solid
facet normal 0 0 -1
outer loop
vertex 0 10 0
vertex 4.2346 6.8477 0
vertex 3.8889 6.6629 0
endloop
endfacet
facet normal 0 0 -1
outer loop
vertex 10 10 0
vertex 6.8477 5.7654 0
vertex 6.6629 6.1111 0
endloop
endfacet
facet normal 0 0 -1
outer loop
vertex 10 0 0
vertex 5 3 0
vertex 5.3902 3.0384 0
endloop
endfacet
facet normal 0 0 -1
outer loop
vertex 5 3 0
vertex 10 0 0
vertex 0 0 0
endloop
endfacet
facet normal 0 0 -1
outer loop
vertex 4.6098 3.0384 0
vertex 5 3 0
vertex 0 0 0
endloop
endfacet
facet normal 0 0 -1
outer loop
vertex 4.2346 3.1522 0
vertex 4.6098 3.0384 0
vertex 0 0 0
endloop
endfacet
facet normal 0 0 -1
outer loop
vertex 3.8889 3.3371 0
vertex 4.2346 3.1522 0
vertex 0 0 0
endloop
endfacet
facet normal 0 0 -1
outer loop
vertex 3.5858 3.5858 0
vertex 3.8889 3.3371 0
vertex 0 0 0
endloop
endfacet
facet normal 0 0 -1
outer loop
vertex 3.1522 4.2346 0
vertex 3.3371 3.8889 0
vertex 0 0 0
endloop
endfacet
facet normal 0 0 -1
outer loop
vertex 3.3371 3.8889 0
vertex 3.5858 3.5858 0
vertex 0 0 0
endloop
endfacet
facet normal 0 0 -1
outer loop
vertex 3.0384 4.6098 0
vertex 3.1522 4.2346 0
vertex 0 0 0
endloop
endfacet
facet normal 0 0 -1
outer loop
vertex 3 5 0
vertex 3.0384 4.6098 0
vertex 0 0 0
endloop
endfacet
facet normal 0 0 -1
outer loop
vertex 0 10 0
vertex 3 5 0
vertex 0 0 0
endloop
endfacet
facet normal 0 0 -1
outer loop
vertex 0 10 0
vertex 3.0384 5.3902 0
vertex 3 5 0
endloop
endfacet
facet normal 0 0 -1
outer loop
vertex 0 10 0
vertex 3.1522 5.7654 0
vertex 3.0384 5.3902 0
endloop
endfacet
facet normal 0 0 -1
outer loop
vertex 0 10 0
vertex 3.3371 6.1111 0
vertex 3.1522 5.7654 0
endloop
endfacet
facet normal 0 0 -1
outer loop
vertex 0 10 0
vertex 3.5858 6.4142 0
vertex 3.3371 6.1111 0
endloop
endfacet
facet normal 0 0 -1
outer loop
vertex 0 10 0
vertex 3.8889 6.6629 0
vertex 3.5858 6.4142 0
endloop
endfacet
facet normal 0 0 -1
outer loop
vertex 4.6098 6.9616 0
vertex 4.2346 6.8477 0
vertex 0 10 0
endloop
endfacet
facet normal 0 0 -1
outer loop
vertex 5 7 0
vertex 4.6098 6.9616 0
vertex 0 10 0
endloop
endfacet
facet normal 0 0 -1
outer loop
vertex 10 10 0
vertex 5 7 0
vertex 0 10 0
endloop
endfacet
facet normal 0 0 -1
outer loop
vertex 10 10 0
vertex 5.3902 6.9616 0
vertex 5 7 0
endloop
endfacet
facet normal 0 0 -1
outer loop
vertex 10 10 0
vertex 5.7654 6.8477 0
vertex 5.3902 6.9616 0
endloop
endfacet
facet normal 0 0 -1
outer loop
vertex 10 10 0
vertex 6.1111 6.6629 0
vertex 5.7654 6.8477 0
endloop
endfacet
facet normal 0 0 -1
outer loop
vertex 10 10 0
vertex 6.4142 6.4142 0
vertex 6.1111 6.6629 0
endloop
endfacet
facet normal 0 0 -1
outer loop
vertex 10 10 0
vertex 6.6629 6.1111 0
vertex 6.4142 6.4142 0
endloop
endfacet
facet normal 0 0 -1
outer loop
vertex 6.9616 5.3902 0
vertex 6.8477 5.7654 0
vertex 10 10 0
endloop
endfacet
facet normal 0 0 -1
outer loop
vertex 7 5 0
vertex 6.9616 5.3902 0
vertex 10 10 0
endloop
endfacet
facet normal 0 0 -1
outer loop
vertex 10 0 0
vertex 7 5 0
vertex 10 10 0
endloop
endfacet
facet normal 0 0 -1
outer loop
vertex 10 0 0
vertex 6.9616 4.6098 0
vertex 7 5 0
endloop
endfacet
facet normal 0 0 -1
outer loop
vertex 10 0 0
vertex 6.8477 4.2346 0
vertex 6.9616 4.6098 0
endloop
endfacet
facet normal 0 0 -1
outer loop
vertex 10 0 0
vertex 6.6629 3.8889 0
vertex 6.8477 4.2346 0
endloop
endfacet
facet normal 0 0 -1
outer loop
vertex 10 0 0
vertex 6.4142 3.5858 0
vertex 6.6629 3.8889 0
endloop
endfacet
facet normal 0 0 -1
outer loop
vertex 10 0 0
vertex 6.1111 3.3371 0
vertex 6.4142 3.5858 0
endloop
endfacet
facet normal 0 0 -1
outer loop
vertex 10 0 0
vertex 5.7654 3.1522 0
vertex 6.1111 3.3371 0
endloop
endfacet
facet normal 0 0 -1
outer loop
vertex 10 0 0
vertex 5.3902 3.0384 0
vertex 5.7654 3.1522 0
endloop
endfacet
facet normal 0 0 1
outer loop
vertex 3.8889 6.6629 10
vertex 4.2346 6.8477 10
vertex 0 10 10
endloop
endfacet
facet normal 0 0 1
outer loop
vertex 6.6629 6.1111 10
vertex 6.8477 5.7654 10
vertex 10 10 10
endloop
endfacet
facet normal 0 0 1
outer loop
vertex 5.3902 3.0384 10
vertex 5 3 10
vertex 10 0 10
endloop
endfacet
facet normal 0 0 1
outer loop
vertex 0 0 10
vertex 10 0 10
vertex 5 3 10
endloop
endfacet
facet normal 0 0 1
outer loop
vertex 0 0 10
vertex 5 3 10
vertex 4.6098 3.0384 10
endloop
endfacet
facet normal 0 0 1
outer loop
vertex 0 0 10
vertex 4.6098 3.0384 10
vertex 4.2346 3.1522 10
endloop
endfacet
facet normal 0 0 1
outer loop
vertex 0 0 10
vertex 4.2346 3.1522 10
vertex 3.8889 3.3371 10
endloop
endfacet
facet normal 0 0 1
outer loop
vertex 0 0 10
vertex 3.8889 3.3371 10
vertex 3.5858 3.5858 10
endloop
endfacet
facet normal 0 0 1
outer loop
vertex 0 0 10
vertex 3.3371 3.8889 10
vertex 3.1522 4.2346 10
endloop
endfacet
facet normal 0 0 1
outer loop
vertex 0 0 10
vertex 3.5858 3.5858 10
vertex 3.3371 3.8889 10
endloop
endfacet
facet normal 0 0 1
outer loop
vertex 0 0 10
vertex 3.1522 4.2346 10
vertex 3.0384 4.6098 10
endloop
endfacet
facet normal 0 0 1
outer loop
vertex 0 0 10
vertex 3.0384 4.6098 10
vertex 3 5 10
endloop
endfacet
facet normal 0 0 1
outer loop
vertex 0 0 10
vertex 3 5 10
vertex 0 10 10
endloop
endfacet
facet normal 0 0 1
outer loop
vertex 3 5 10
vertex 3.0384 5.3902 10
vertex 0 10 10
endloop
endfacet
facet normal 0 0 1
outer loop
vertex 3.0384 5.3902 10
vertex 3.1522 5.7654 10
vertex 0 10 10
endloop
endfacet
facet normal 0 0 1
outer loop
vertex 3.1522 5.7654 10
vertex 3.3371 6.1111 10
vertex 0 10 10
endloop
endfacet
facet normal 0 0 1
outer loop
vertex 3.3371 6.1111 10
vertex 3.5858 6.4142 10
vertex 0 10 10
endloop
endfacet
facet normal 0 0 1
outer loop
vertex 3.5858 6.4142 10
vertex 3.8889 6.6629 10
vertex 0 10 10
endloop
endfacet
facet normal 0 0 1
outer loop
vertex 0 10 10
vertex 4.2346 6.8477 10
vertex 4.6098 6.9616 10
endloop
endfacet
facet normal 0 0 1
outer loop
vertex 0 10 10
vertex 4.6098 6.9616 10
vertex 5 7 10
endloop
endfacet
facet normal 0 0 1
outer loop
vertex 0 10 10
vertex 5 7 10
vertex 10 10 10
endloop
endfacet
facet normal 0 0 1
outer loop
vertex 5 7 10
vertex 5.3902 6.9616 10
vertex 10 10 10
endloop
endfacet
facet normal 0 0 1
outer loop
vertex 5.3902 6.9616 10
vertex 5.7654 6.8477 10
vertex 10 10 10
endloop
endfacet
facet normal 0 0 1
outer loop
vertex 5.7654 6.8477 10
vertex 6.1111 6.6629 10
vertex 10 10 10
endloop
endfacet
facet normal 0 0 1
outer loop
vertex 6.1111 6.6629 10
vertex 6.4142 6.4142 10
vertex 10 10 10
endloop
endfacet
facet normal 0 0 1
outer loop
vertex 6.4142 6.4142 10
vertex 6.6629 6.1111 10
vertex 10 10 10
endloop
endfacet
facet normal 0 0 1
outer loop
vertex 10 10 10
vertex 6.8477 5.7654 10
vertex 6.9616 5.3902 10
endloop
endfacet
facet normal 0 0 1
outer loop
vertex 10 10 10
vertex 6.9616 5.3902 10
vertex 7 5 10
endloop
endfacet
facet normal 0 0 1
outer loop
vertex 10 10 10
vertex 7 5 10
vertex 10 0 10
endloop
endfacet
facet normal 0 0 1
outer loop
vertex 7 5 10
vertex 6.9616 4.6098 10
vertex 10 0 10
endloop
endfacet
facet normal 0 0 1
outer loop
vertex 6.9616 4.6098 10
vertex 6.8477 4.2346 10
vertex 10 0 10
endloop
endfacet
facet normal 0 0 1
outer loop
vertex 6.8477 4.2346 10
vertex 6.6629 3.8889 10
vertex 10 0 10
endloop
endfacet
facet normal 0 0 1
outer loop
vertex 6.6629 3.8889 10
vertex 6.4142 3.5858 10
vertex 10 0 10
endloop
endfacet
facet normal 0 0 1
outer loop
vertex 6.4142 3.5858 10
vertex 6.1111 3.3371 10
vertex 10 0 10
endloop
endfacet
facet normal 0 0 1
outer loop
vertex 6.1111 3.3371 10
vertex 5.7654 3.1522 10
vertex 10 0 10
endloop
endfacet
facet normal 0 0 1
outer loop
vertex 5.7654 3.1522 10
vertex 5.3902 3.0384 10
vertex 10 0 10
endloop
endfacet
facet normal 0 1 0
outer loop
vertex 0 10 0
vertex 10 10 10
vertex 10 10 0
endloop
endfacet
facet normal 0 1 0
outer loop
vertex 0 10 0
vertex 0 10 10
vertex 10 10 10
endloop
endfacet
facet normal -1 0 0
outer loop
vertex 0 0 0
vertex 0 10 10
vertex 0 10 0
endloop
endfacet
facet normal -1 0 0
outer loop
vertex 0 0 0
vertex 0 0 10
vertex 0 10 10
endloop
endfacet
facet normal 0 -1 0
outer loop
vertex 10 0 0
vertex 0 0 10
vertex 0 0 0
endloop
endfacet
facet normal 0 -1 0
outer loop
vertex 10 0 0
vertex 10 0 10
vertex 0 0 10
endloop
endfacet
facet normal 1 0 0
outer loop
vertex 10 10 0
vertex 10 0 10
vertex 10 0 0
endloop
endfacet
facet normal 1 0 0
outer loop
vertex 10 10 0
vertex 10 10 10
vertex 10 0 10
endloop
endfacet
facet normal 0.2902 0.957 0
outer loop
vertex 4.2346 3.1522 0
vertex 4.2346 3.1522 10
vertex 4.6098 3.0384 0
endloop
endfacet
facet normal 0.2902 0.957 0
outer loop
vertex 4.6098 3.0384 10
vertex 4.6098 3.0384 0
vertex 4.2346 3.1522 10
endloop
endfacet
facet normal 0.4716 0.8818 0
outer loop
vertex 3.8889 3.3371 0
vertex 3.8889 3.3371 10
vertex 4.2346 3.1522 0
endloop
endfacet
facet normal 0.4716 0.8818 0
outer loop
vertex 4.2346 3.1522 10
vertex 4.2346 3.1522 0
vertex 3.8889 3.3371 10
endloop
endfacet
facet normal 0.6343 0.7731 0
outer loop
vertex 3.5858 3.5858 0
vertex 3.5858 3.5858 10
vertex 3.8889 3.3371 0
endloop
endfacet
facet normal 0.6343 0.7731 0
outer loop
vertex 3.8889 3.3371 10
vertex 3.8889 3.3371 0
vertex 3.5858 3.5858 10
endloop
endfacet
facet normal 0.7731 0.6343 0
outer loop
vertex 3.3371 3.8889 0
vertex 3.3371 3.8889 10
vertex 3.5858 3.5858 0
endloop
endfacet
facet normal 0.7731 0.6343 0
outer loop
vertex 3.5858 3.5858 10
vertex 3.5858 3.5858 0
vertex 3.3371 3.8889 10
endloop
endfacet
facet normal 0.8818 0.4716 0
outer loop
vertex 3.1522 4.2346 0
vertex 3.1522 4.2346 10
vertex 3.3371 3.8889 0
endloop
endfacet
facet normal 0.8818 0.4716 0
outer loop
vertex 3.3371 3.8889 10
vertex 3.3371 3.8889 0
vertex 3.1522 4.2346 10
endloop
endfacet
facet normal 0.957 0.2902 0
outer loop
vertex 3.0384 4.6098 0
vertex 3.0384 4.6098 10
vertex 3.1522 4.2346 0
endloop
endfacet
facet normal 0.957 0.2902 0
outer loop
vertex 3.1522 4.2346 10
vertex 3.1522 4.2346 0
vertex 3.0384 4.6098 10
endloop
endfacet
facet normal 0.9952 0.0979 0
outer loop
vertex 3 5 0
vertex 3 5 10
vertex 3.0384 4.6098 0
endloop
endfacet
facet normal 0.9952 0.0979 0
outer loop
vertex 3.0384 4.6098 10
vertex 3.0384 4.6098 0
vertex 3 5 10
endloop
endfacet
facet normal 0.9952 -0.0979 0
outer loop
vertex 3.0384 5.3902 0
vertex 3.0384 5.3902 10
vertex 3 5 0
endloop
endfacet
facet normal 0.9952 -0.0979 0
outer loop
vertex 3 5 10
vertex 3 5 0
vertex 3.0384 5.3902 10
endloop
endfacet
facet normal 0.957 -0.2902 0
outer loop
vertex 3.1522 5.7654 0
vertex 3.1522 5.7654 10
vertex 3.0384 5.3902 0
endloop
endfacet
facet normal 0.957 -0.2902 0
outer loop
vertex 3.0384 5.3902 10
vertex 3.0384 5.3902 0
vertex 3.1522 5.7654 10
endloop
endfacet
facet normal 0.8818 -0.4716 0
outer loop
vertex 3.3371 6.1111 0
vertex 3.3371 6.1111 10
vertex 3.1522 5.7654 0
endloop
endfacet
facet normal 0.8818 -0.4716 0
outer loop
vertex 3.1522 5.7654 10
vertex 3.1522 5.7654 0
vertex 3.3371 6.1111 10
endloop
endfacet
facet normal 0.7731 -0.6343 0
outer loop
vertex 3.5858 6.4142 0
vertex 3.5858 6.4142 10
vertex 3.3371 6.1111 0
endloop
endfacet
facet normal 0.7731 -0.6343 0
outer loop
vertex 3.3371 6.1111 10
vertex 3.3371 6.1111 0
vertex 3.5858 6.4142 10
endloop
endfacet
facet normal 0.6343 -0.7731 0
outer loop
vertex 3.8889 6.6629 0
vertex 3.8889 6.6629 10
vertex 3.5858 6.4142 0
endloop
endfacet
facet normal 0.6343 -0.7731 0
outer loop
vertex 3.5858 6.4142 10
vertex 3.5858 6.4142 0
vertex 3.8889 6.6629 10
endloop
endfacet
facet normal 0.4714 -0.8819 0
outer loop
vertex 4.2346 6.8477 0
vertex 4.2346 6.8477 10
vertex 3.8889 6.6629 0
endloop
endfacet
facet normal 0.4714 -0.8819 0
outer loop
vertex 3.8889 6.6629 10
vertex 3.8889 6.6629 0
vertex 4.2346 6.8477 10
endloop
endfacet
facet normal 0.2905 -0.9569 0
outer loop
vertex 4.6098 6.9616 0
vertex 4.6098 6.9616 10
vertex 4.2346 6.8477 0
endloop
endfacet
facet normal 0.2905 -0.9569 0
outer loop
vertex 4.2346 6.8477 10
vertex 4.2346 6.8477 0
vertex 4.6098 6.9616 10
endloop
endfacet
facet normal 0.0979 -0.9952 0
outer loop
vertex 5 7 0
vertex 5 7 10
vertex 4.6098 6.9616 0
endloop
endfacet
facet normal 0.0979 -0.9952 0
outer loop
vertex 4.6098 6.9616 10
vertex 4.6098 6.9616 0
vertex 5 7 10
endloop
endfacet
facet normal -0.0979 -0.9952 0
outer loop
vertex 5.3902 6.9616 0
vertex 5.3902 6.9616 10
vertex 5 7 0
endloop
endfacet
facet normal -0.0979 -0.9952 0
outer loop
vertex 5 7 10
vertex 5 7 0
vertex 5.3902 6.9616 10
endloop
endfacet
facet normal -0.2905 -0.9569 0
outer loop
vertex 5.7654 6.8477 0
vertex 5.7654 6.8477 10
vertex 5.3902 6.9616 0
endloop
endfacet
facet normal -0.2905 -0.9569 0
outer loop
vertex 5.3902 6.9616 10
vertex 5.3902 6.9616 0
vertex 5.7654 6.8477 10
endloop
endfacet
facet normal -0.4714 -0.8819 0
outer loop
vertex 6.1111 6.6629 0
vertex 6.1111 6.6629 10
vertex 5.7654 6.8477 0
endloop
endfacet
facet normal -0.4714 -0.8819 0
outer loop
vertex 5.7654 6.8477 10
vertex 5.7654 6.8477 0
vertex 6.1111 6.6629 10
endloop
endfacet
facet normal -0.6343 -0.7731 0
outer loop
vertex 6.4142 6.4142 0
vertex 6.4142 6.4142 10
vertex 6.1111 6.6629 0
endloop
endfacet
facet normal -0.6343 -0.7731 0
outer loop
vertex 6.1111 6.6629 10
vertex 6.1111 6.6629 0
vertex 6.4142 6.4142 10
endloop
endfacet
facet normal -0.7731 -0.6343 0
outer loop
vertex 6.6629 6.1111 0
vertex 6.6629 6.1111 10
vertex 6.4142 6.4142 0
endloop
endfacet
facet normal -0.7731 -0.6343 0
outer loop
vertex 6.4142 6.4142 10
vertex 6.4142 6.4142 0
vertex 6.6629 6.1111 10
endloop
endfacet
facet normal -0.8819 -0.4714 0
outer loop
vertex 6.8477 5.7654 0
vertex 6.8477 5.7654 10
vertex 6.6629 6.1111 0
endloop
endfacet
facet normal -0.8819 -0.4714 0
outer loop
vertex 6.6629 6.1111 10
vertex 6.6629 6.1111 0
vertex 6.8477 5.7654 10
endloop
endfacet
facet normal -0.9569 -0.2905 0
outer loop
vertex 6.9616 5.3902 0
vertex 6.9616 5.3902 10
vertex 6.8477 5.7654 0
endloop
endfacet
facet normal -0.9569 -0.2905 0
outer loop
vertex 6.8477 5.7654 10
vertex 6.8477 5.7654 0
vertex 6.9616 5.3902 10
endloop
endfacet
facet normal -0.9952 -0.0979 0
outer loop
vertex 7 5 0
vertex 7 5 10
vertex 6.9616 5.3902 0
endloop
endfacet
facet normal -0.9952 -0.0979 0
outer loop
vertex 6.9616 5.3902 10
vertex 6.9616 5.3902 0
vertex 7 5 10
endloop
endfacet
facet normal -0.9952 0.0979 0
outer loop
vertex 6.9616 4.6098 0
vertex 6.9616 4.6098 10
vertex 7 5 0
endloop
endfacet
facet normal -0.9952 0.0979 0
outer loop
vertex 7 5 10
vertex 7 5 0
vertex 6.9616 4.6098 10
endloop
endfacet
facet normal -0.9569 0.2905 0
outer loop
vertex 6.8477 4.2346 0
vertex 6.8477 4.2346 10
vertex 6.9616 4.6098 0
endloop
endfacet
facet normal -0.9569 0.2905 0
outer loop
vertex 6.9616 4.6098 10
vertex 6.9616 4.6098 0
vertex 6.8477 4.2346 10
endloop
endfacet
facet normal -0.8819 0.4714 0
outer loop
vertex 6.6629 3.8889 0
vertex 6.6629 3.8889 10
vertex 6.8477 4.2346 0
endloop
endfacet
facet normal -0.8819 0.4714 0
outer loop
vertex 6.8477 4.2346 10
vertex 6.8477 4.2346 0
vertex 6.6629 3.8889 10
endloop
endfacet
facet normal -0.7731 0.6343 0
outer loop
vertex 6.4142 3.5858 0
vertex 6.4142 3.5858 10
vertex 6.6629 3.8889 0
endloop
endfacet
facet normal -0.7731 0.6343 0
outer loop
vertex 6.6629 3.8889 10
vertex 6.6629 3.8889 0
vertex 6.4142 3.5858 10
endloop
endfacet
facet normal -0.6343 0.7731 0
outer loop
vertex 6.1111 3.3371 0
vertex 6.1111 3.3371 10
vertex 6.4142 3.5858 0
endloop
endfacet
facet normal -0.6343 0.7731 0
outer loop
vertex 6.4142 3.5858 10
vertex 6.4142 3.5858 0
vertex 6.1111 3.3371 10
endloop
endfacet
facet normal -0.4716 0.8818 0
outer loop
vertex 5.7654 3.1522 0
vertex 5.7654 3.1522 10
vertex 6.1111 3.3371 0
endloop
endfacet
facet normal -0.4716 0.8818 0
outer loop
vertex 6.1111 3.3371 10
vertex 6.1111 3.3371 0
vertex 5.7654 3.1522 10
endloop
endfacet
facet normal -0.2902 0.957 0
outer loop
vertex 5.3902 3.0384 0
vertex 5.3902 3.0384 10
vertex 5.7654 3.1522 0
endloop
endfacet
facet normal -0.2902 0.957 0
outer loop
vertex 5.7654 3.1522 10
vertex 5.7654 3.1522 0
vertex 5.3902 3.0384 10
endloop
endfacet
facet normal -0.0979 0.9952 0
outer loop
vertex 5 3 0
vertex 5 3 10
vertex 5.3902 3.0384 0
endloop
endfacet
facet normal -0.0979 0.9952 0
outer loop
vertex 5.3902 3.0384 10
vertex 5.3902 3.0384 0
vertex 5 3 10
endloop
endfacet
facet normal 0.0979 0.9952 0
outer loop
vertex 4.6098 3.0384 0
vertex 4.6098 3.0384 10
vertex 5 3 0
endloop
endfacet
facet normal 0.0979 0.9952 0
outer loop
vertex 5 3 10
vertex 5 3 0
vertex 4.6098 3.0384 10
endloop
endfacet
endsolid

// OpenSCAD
// Corpus model: a plate with a round through-hole, built via the 2D subsystem
// (square − circle, then linear-extruded). Exercises the parser's 2D primitives,
// the 2D `difference` → hole path, and the hole-bridging cap triangulation — the
// result is a closed manifold built directly, with no CSG differencing.
linear_extrude(10) difference() {
    square([10, 10]);
    translate([5, 5]) circle(2, $fn = 32);
}
